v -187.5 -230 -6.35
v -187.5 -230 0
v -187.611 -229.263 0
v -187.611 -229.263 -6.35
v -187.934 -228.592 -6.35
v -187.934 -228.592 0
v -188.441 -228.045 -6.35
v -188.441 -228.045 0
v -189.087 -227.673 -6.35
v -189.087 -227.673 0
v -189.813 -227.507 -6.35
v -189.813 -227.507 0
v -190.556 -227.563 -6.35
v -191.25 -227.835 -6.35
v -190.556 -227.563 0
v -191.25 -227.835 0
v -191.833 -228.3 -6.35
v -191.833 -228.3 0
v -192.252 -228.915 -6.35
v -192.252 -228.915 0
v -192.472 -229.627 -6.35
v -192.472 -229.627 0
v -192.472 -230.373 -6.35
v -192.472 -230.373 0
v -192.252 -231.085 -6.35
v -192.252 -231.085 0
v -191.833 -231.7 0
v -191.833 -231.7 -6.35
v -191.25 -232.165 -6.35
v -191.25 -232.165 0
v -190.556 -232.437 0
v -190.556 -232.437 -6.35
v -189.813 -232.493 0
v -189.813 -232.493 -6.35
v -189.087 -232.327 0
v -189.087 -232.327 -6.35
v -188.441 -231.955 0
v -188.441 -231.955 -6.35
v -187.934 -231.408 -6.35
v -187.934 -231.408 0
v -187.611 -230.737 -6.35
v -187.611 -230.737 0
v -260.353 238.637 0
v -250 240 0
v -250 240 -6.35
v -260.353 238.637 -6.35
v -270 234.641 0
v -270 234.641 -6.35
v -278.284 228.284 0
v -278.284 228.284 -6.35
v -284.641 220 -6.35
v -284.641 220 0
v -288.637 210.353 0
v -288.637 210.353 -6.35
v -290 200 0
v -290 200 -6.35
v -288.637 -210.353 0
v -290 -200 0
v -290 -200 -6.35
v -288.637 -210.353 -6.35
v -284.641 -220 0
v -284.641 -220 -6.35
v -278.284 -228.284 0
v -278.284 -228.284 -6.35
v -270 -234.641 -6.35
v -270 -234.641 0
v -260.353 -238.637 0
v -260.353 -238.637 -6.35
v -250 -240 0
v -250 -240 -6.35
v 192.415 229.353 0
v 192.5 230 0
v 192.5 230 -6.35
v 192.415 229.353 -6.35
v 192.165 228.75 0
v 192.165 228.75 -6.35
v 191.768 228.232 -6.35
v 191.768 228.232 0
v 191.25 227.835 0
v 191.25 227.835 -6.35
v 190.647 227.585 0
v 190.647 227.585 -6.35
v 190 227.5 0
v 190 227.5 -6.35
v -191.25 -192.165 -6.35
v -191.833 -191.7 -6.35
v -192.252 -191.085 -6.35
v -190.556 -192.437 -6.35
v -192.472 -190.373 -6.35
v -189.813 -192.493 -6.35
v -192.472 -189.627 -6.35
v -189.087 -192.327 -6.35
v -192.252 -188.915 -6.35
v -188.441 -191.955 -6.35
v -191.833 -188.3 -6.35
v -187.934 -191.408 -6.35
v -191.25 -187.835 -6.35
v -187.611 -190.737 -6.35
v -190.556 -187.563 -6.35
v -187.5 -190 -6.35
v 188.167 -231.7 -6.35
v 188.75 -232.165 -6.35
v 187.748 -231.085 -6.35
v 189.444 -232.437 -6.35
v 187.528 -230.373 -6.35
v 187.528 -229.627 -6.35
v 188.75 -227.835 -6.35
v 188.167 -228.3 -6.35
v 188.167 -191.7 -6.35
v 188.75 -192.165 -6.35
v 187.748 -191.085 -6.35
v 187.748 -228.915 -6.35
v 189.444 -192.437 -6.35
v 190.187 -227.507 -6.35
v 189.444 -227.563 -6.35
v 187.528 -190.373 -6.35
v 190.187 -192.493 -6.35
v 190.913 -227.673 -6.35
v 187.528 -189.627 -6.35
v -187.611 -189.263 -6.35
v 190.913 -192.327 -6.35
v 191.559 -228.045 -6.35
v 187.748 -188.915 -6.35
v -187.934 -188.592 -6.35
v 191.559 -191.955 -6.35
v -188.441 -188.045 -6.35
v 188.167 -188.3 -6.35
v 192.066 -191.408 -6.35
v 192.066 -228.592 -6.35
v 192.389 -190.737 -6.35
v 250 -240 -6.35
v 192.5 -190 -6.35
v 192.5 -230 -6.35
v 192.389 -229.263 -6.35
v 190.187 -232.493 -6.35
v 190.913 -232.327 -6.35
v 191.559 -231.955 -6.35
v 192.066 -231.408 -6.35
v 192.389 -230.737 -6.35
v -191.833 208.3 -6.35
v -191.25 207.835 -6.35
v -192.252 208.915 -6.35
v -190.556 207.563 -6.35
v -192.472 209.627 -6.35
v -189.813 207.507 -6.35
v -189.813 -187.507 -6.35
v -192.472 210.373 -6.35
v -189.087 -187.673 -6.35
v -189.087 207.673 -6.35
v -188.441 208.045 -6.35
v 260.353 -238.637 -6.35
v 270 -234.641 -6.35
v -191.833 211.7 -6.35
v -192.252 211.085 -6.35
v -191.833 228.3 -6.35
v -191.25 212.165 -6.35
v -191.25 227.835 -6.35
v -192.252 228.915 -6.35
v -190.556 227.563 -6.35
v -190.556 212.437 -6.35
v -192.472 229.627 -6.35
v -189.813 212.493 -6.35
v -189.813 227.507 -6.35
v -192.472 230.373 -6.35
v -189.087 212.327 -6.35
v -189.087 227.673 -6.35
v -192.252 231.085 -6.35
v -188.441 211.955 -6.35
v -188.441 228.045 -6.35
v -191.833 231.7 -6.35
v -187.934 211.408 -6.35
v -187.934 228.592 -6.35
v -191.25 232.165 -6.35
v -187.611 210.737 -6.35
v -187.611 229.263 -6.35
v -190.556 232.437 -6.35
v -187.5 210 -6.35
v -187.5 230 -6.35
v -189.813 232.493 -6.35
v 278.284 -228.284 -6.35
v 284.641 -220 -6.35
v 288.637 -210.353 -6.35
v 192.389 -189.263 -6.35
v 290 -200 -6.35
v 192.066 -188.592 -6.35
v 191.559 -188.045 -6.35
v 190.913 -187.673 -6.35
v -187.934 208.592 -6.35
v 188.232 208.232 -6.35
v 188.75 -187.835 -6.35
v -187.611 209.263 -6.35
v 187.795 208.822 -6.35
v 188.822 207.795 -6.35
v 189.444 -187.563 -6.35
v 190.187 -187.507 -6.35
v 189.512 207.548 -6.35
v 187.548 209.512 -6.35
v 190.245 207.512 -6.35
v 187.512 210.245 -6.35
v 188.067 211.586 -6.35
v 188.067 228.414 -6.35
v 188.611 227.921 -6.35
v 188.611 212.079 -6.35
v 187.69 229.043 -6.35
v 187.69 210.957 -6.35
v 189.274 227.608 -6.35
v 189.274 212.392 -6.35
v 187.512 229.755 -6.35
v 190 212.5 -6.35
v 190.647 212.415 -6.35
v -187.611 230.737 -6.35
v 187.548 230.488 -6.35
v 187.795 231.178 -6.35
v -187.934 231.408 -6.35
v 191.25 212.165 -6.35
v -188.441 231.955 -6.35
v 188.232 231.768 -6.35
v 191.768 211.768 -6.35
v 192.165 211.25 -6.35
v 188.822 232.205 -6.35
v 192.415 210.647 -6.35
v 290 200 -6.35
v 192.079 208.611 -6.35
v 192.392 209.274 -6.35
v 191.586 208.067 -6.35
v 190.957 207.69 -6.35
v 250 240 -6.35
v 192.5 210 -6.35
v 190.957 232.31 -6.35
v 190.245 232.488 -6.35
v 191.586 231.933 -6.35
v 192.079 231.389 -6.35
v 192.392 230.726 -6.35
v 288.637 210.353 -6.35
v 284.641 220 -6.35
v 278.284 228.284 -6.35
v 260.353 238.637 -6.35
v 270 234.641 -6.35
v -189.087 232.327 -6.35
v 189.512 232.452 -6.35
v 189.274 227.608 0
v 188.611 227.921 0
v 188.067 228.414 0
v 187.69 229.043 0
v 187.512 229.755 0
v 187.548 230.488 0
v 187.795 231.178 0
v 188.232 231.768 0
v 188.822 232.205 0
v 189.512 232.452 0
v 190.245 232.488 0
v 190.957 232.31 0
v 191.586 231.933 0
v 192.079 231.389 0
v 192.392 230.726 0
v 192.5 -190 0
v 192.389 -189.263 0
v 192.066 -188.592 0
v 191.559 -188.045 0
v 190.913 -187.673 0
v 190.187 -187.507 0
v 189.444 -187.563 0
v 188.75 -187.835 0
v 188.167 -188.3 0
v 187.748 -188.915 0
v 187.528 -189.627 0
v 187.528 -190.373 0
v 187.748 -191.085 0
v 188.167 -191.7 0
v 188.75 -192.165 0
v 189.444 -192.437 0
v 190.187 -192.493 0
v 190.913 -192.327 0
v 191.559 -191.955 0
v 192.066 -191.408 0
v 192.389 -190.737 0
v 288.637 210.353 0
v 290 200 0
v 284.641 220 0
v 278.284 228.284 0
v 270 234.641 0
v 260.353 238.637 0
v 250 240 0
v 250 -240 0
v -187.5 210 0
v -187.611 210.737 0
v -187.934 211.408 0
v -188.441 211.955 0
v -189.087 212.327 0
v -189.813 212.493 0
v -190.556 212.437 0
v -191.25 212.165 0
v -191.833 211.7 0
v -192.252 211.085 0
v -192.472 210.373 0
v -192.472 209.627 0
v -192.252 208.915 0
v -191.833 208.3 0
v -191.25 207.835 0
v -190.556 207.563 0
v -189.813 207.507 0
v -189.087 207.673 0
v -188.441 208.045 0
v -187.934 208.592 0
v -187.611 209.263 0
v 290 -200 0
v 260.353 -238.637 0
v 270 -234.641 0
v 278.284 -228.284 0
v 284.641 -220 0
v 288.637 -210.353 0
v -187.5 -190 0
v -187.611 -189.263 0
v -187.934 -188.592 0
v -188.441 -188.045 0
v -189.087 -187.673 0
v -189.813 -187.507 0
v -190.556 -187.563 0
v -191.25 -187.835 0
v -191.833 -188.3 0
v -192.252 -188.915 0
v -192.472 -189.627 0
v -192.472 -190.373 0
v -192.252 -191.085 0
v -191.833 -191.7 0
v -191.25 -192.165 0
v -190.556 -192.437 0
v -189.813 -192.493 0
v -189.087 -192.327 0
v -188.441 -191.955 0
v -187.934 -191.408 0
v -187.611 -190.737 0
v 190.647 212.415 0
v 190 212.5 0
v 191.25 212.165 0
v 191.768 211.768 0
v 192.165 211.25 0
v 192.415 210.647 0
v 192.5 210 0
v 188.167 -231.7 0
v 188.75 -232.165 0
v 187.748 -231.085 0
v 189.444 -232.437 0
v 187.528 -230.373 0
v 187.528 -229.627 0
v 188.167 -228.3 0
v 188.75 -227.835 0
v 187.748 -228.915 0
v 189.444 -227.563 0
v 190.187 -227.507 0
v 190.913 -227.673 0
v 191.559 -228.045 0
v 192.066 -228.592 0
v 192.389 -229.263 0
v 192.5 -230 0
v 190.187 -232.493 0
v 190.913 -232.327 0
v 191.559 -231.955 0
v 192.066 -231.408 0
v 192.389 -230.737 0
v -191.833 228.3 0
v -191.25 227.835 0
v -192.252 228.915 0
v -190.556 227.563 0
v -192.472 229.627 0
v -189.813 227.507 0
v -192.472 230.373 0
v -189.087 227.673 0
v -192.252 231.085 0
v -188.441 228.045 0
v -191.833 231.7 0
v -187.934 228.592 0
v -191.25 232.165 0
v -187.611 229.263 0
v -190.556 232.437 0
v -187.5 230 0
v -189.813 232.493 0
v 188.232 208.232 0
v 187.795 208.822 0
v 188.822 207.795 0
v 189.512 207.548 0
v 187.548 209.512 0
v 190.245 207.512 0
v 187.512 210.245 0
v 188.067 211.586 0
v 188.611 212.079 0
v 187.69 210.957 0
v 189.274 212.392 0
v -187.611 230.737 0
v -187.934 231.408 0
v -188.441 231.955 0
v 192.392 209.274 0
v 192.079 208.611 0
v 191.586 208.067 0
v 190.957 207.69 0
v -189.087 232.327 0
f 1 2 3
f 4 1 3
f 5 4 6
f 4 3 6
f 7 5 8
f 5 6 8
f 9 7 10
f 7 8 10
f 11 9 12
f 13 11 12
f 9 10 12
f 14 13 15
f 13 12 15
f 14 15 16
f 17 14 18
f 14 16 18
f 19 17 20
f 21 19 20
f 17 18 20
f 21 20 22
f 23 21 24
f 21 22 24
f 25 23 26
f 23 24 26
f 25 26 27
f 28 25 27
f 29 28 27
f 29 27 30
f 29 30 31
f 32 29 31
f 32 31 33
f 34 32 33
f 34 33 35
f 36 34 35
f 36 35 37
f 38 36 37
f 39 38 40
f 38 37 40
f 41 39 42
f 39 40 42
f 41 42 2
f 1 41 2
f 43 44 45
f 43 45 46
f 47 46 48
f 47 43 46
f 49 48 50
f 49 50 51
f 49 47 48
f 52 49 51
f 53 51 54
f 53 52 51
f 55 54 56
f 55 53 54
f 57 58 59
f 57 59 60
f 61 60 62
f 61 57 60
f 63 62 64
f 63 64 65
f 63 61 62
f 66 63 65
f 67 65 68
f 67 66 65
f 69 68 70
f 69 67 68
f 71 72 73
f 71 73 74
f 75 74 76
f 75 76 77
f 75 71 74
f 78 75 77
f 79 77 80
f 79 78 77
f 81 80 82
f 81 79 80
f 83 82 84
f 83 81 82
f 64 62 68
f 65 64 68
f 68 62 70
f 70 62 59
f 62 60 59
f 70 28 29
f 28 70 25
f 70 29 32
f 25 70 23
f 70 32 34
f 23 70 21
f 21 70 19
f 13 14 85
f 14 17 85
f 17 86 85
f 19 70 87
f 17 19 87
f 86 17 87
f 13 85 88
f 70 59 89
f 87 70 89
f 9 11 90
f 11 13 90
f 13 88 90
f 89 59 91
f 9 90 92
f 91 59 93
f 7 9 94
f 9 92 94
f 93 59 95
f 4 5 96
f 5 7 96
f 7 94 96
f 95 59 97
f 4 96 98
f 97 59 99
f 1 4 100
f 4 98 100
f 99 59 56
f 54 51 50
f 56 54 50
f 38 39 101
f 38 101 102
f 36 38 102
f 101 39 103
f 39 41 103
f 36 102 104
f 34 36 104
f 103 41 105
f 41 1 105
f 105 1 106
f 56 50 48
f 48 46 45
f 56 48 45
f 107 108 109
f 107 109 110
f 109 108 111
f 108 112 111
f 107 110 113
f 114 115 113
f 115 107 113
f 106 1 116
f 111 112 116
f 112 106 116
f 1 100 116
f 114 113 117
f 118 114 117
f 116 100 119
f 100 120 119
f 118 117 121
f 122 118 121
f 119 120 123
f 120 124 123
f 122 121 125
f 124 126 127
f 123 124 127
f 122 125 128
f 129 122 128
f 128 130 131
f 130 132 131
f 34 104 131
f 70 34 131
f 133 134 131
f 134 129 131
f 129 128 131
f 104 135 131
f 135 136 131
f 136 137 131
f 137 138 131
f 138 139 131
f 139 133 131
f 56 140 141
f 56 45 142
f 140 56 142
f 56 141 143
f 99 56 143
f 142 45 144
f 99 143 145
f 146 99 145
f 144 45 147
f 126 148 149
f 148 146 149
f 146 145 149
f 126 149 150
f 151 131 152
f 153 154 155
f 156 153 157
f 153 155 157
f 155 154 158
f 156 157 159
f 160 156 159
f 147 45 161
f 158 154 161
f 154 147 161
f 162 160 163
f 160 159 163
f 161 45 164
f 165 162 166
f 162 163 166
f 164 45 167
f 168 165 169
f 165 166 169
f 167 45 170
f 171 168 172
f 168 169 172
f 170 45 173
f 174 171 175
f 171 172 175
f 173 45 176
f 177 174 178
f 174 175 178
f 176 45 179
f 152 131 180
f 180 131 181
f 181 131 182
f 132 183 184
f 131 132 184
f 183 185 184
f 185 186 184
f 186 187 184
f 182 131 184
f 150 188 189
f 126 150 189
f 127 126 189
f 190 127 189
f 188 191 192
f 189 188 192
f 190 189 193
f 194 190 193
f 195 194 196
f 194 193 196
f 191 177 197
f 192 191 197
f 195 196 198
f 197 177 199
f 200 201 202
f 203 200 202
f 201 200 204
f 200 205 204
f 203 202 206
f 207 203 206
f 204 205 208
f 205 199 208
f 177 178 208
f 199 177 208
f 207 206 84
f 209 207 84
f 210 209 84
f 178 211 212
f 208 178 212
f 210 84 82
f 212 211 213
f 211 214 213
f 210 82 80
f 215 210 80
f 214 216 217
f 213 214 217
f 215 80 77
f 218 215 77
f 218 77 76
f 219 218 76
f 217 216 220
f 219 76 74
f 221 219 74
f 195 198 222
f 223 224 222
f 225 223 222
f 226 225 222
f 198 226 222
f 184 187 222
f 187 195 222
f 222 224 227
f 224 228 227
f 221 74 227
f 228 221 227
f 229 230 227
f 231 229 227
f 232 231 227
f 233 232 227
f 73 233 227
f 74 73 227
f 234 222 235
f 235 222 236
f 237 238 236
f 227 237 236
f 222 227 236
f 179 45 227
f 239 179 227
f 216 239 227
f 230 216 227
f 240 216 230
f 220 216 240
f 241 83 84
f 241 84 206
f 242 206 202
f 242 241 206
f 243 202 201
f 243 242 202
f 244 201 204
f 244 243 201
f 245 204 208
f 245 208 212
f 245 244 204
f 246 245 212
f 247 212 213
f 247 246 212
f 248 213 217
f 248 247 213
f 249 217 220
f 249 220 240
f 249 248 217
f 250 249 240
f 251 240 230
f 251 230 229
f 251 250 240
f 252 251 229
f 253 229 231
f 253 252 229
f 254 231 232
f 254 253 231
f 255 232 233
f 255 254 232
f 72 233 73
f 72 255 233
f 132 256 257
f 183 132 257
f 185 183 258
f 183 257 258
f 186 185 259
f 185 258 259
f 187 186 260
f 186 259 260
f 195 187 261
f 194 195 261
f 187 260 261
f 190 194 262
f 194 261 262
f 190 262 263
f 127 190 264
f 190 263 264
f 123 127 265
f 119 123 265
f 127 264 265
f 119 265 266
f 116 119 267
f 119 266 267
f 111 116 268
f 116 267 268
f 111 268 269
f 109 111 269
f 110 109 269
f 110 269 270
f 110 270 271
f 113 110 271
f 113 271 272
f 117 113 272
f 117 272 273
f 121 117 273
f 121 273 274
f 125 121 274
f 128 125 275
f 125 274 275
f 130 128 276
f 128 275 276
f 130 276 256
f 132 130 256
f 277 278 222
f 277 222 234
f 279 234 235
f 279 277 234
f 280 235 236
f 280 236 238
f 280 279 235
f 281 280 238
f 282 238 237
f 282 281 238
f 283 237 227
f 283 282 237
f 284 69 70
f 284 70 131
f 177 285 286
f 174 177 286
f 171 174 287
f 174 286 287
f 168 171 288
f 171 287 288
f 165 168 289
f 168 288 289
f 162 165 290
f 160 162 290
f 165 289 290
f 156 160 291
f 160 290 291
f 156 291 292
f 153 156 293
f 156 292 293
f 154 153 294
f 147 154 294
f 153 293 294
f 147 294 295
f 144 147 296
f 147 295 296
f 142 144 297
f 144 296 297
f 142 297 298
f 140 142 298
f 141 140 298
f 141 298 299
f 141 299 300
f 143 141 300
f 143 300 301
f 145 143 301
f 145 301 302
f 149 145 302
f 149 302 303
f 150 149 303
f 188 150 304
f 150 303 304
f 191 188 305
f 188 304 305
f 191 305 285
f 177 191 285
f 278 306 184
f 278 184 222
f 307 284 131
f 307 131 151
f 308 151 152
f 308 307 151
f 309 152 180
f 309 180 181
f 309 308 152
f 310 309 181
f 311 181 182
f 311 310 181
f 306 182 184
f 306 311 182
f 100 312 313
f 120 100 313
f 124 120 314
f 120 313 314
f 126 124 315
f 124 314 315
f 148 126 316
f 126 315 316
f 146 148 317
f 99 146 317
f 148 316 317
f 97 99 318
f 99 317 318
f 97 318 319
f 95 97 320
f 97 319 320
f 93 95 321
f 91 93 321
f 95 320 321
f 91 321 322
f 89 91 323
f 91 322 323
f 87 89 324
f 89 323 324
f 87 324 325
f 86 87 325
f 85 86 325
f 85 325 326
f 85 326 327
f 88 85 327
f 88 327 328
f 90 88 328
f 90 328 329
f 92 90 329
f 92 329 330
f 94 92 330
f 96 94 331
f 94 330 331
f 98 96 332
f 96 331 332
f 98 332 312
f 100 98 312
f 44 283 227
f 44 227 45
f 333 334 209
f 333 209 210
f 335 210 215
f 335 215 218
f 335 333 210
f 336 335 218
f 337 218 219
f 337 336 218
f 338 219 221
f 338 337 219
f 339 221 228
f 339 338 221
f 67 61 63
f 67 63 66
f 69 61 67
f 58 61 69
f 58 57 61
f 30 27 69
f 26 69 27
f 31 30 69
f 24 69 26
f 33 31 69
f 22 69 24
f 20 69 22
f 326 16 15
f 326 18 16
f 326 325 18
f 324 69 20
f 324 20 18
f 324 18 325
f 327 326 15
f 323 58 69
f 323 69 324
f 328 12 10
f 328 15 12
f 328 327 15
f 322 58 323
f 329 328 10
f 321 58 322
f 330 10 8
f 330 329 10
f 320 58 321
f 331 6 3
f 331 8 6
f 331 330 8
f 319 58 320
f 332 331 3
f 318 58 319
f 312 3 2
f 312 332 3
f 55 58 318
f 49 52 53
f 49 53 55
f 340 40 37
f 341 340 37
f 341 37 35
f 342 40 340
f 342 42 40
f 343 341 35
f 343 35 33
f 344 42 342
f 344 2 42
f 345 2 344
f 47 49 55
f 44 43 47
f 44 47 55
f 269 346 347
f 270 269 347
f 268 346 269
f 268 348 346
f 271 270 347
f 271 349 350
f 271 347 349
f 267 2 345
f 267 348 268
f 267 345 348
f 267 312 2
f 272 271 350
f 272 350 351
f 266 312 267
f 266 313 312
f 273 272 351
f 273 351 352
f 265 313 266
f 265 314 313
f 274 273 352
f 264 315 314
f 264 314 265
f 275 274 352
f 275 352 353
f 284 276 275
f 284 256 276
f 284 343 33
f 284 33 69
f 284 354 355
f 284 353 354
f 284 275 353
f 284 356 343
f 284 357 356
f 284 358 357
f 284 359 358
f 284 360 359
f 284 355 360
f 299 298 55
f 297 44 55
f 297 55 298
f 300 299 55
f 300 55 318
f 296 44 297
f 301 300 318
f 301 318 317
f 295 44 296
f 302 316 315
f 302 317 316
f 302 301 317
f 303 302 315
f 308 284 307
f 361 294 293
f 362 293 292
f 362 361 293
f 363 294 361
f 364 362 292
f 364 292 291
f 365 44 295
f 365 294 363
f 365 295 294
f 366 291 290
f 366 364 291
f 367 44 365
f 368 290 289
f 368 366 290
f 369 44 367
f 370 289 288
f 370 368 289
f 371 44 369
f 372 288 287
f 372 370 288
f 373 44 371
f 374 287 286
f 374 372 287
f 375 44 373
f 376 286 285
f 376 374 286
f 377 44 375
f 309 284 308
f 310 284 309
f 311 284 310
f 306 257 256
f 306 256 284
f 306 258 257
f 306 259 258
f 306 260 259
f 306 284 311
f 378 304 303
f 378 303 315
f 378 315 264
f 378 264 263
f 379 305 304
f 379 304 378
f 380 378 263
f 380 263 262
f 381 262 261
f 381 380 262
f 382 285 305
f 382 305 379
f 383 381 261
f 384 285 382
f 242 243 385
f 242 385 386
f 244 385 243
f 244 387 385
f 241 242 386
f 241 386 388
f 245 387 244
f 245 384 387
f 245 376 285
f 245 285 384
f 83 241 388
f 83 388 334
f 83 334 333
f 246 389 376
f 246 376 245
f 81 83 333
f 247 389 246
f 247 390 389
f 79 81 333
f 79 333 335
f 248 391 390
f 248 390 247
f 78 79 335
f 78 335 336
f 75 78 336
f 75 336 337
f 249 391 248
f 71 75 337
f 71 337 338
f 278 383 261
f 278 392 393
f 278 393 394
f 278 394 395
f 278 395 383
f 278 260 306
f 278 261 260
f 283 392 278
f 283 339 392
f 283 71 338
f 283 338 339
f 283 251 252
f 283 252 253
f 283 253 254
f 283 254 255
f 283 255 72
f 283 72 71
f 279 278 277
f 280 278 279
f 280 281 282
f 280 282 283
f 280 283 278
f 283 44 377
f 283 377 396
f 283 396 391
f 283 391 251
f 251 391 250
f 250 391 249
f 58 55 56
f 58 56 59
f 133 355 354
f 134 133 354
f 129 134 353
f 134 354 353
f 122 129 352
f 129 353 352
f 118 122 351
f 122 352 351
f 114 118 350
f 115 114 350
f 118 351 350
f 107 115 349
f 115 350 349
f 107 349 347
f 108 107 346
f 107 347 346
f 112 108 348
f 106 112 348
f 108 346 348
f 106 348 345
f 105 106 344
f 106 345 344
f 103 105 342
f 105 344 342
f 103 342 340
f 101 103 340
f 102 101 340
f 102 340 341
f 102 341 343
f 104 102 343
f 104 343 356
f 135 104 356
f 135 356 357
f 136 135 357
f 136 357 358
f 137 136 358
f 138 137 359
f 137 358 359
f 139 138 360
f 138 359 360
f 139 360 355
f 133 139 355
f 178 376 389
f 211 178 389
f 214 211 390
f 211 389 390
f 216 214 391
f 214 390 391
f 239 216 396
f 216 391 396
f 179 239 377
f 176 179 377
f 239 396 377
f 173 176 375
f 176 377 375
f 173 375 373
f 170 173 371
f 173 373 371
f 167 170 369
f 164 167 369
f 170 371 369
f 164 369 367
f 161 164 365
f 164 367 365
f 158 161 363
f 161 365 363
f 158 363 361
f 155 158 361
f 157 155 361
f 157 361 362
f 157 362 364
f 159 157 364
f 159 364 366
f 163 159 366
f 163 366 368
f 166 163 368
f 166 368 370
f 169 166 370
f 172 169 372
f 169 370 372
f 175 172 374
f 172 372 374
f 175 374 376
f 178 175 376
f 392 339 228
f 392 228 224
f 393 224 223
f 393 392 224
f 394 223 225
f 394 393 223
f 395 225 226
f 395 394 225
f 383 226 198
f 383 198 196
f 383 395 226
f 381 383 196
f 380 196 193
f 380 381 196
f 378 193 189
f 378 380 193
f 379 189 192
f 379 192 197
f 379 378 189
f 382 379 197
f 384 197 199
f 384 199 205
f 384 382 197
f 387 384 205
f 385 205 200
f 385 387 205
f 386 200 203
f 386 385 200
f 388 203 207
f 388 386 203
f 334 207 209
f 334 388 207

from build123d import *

# Parameters (mm, degrees)
F0_R     = 2.5
F1_DEPTH = 6.35


# Not quite as in the source:
# - a length typed as a fraction of an inch, garbled in the dataset ("3 / 203.2 mm" for 3/8 in), is restored


with BuildPart() as f1:
    # F0 (on Top) → F1 (new body)
    with BuildSketch(Plane.XY):
        with BuildLine():
            Line((-250, -240), (250, -240))
            ThreePointArc((250, -240), (278.2842712475, -228.2842712475), (290, -200))
            Line((290, -200), (290, 200))
            ThreePointArc((290, 200), (278.2842712475, 228.2842712475), (250, 240))
            Line((250, 240), (-250, 240))
            ThreePointArc((-250, 240), (-278.2842712475, 228.2842712475), (-290, 200))
            Line((-290, 200), (-290, -200))
            ThreePointArc((-290, -200), (-278.2842712475, -228.2842712475), (-250, -240))
        make_face()
        with Locations((-190, -230)):
            Circle(F0_R, mode=Mode.SUBTRACT)
        with Locations((-190, -190)):
            Circle(F0_R, mode=Mode.SUBTRACT)
        with Locations((190, -230)):
            Circle(F0_R, mode=Mode.SUBTRACT)
        with Locations((190, -190)):
            Circle(F0_R, mode=Mode.SUBTRACT)
        with Locations((-190, 210)):
            Circle(F0_R, mode=Mode.SUBTRACT)
        with Locations((-190, 230)):
            Circle(F0_R, mode=Mode.SUBTRACT)
        with BuildLine():
            ThreePointArc((190, 212.5), (191.767766953, 211.767766953), (192.5, 210))
            ThreePointArc((192.5, 210), (188.232233047, 208.232233047), (190, 212.5))
        make_face(mode=Mode.SUBTRACT)
        with BuildLine():
            ThreePointArc((192.5, 230), (191.767766953, 228.232233047), (190, 227.5))
            ThreePointArc((190, 227.5), (188.232233047, 231.767766953), (192.5, 230))
        make_face(mode=Mode.SUBTRACT)
    extrude(amount=-F1_DEPTH)


solid = f1.part
